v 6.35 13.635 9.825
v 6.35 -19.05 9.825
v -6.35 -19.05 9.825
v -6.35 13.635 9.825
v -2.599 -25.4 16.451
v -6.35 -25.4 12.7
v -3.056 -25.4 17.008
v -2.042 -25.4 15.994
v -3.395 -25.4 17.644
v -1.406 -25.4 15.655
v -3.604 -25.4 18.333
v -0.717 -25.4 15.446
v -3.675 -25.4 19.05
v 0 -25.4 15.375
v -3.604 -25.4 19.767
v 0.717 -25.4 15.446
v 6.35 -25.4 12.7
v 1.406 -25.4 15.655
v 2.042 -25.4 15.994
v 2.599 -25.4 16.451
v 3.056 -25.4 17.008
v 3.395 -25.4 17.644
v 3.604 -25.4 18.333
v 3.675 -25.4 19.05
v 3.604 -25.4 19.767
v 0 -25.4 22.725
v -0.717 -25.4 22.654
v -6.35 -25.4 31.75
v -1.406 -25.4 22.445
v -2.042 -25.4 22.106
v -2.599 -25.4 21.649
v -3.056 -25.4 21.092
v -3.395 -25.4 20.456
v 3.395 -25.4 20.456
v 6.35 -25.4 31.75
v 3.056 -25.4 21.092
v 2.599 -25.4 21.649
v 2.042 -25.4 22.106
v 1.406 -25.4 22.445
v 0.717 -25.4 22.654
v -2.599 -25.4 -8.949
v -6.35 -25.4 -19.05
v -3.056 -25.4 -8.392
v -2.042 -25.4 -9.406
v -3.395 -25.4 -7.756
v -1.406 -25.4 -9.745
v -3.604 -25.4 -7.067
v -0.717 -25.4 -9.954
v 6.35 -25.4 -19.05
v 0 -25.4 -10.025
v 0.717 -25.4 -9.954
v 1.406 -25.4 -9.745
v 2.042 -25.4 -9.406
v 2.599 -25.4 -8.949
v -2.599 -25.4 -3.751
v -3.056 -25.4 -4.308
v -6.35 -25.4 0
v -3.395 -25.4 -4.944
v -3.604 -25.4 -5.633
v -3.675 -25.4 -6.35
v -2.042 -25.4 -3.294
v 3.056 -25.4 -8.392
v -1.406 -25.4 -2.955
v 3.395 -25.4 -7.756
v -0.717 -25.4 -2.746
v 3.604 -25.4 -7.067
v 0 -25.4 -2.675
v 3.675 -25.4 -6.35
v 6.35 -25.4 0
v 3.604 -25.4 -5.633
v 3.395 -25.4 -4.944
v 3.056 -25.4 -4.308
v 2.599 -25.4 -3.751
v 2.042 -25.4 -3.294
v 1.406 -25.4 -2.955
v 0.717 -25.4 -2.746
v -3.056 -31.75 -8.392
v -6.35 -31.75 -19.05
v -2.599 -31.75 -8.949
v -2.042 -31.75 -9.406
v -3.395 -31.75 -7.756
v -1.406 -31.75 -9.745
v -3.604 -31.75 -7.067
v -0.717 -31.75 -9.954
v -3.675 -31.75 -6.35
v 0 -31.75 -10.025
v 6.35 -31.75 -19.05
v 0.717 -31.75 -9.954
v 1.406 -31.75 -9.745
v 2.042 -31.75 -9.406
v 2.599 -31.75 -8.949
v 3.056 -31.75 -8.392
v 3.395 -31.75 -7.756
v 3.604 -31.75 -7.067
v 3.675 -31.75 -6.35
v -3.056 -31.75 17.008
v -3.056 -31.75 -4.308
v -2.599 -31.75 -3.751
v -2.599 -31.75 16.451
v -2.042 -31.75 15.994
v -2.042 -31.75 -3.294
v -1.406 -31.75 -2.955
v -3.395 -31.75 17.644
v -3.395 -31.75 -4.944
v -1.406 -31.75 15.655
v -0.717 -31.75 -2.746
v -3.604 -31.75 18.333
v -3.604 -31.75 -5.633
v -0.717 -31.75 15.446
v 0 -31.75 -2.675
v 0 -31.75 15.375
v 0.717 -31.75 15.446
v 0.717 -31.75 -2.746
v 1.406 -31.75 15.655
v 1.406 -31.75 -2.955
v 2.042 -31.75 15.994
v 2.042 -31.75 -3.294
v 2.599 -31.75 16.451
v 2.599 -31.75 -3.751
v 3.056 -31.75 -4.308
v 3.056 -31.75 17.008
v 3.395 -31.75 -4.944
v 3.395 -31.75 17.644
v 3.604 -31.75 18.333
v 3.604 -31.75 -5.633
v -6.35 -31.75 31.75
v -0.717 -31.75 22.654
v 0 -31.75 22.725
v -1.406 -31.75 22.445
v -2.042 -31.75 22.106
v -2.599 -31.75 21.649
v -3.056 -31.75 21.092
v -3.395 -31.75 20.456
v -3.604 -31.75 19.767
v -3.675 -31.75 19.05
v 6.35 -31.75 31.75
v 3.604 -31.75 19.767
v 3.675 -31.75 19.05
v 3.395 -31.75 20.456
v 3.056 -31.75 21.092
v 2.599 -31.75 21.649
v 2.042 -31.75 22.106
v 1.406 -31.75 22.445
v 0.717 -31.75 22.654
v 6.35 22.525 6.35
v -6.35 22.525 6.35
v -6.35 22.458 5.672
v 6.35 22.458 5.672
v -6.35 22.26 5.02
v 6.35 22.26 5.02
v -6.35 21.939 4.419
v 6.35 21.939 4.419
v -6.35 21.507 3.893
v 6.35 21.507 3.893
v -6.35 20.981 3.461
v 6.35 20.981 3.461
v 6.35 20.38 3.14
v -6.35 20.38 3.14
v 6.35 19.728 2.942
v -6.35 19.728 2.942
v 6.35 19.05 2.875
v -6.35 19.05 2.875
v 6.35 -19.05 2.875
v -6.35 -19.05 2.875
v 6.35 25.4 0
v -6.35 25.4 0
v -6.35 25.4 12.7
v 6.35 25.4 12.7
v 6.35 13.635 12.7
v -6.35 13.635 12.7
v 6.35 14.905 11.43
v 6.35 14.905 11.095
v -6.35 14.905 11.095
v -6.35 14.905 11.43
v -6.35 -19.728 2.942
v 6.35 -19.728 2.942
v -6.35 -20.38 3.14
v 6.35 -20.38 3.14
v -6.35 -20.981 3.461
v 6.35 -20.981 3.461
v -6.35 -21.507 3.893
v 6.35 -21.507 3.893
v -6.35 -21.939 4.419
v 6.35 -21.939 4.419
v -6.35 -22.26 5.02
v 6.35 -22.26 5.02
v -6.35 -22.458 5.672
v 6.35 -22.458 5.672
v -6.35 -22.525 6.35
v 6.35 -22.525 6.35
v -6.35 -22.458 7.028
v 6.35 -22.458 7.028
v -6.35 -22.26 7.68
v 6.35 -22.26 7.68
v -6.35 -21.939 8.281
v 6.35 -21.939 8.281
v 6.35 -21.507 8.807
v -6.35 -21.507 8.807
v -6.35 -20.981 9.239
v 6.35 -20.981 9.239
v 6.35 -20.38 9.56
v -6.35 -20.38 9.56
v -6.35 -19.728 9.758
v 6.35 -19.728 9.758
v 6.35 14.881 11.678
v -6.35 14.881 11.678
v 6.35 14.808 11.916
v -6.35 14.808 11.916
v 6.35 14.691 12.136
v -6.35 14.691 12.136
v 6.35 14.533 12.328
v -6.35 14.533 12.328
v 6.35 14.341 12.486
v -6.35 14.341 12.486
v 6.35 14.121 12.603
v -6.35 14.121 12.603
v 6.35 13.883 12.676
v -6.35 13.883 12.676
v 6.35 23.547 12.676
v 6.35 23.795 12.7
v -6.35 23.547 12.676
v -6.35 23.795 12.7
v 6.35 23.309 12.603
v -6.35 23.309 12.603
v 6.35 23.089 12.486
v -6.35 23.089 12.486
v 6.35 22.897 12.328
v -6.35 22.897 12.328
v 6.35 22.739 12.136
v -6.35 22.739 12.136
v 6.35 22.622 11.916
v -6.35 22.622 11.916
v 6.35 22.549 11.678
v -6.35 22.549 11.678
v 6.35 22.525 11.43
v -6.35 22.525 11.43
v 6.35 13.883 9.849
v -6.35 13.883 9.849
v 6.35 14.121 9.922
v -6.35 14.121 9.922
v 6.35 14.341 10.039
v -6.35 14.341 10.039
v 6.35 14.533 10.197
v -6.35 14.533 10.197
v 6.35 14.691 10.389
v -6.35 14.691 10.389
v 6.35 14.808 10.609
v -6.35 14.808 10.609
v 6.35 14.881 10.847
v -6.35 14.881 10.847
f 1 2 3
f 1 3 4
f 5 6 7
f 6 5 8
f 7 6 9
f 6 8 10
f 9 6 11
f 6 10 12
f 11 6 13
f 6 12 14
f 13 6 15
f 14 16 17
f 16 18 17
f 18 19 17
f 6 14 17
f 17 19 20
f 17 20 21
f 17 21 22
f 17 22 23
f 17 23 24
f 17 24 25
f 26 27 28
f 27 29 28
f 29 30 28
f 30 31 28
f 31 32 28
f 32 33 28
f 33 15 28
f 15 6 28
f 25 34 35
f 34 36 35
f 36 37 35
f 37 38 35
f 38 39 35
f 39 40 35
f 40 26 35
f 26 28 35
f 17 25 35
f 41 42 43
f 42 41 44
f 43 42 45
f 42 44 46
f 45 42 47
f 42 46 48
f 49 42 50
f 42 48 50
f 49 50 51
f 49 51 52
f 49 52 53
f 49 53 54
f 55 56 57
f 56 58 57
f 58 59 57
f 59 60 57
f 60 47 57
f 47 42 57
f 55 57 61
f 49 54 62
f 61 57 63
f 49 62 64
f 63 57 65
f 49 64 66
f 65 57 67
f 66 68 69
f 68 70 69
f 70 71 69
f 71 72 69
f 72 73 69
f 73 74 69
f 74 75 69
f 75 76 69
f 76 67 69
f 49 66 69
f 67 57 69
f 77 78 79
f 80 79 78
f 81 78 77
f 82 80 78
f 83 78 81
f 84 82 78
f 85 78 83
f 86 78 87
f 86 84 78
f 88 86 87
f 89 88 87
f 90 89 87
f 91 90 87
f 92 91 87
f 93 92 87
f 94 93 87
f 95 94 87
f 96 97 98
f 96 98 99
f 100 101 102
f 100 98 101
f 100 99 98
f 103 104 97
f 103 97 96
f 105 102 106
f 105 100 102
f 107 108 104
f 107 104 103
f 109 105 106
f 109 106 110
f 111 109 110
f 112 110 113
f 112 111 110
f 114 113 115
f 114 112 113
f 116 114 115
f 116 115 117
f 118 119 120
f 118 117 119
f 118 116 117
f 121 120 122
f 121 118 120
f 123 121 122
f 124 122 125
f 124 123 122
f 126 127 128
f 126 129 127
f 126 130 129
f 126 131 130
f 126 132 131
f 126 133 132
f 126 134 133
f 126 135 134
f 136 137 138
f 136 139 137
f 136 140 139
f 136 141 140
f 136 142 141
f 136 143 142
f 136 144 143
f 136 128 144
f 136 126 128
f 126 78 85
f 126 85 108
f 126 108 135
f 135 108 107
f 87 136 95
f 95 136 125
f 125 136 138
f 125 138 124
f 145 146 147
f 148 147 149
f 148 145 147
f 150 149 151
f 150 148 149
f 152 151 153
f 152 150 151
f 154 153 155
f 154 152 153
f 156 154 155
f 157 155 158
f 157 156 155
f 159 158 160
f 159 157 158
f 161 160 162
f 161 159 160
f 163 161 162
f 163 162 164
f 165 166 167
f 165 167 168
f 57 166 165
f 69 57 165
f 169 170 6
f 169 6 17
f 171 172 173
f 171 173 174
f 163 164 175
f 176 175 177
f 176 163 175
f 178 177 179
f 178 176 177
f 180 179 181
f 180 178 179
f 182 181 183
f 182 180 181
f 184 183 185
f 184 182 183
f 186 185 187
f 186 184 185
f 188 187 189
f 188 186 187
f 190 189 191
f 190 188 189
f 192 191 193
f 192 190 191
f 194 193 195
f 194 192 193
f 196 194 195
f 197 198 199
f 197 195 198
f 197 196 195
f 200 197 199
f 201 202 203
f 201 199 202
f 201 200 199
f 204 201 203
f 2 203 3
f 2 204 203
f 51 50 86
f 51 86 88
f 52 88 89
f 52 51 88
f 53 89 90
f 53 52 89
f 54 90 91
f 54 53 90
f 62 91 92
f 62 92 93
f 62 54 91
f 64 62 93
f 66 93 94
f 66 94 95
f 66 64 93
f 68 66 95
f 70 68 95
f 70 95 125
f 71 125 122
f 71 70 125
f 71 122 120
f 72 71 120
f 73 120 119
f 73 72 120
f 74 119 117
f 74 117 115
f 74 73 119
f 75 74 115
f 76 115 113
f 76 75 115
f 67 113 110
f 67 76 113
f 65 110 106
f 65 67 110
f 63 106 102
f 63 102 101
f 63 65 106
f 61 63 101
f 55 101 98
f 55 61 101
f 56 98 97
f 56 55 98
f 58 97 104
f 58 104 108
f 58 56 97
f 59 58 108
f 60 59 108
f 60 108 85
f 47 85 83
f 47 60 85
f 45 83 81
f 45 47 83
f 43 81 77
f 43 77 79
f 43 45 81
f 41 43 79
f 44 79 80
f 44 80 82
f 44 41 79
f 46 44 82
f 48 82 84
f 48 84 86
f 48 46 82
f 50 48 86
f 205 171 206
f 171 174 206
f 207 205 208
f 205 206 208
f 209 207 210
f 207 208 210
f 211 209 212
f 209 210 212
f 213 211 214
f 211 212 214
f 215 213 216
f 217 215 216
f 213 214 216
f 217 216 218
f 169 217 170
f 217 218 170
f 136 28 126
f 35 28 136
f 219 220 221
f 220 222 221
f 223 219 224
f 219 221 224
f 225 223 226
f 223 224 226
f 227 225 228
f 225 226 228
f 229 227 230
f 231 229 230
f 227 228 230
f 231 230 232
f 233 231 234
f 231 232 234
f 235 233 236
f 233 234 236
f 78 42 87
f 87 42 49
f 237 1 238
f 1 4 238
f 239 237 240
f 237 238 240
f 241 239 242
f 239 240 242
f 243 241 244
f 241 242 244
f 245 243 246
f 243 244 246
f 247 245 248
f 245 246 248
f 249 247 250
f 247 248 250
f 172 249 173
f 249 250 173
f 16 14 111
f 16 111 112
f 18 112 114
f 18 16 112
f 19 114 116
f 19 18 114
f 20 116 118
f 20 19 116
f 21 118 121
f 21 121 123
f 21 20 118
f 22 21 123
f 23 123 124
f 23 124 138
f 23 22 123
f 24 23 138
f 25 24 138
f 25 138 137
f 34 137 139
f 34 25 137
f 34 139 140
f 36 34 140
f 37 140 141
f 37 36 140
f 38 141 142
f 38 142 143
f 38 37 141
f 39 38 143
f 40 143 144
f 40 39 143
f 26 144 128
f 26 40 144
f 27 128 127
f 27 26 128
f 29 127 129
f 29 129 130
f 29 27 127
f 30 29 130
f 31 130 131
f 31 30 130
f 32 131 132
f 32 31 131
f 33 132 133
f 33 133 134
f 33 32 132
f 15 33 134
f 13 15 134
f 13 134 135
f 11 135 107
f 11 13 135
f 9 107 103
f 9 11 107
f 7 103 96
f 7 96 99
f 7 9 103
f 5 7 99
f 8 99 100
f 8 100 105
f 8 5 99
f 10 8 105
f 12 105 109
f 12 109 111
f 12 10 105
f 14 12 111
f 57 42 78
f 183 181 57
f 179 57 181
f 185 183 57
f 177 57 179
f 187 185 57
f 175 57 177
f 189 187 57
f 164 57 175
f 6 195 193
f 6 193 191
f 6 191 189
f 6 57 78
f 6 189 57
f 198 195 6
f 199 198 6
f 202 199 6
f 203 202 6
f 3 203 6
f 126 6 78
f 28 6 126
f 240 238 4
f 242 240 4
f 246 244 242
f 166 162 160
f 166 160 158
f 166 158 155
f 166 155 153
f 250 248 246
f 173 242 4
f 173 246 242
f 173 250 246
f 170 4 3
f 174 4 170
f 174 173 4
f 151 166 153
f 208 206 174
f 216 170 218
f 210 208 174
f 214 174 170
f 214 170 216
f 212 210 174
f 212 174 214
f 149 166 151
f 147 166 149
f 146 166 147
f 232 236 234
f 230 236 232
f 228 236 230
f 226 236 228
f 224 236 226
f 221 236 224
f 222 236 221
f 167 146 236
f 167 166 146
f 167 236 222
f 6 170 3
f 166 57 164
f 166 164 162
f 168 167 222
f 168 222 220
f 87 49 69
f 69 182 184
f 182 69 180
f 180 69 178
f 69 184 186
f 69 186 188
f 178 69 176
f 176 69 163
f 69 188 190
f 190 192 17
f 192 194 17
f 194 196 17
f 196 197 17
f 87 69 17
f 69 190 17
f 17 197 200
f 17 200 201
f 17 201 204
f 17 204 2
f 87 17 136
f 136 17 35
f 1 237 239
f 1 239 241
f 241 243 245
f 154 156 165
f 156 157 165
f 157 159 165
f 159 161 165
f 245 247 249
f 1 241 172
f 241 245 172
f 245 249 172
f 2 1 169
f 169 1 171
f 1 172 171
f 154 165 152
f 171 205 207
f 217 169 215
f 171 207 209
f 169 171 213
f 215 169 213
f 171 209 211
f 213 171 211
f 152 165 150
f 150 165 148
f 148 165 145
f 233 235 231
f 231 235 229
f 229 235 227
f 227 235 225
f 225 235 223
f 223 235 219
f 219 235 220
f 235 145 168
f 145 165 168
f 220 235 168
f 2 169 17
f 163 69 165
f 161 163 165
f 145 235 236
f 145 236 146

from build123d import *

# Parameters (mm, degrees)
SKETCH1_W           = 12.7
SKETCH1_H           = 50.8
BOSS_EXTRUDE1_DEPTH = 12.7
CUT_EXTRUDE1_DEPTH  = 32.108519733
FILLET1_R           = 1.27
SKETCH3_W           = 12.7
SKETCH3_H           = 50.8
SKETCH3_R           = 3.675
BOSS_EXTRUDE2_DEPTH = 6.35


with BuildPart() as part:
    # Sketch1 → Boss-Extrude1 (new body)
    with BuildSketch(Plane.XY):
        Rectangle(SKETCH1_W, SKETCH1_H)
    extrude(amount=BOSS_EXTRUDE1_DEPTH)

    # Sketch2 → Cut-Extrude1 (cut, through all)
    with BuildSketch(Plane(origin=(6.35, 0, 0), x_dir=(0, 0, -1), z_dir=(1, 0, 0))):
        with BuildLine():
            Line((-2.875000092, 19.05), (-2.875000092, -19.05))
            ThreePointArc((-2.875000092, -19.05), (-6.35, -22.524999908), (-9.824999908, -19.05))
            Line((-9.824999908, -19.05), (-9.824999908, 14.904999908))
            Line((-9.824999908, 14.904999908), (-12.7, 14.904999908))
            Line((-12.7, 14.904999908), (-12.7, 22.524999908))
            Line((-12.7, 22.524999908), (-9.824999908, 22.524999908))
            Line((-9.824999908, 22.524999908), (-6.35, 22.524999908))
            ThreePointArc((-6.35, 22.524999908), (-3.892804, 21.507196), (-2.875000092, 19.05))
        make_face()
    extrude(amount=-CUT_EXTRUDE1_DEPTH, mode=Mode.SUBTRACT)

    # Fillet1
    fillet1_edges = [part.edges().sort_by_distance(p)[0] for p in [
        (0, 14.904999908, 9.824999908),
        (0, 14.904999908, 12.7),
        (0, 22.524999908, 12.7),
    ]]
    fillet(fillet1_edges, radius=FILLET1_R)

    # Sketch3 → Boss-Extrude2 (add)
    with BuildSketch(Plane.XZ.offset(25.4)):
        with Locations((0, 6.35)):
            Rectangle(SKETCH3_W, SKETCH3_H)
        with Locations(Location((0, -6.35, 0), (0, 0, 270))):
            Circle(SKETCH3_R, mode=Mode.SUBTRACT)
        with Locations(Location((0, 19.05, 0), (0, 0, 270))):
            Circle(SKETCH3_R, mode=Mode.SUBTRACT)
    extrude(amount=BOSS_EXTRUDE2_DEPTH)


solid = part.part
